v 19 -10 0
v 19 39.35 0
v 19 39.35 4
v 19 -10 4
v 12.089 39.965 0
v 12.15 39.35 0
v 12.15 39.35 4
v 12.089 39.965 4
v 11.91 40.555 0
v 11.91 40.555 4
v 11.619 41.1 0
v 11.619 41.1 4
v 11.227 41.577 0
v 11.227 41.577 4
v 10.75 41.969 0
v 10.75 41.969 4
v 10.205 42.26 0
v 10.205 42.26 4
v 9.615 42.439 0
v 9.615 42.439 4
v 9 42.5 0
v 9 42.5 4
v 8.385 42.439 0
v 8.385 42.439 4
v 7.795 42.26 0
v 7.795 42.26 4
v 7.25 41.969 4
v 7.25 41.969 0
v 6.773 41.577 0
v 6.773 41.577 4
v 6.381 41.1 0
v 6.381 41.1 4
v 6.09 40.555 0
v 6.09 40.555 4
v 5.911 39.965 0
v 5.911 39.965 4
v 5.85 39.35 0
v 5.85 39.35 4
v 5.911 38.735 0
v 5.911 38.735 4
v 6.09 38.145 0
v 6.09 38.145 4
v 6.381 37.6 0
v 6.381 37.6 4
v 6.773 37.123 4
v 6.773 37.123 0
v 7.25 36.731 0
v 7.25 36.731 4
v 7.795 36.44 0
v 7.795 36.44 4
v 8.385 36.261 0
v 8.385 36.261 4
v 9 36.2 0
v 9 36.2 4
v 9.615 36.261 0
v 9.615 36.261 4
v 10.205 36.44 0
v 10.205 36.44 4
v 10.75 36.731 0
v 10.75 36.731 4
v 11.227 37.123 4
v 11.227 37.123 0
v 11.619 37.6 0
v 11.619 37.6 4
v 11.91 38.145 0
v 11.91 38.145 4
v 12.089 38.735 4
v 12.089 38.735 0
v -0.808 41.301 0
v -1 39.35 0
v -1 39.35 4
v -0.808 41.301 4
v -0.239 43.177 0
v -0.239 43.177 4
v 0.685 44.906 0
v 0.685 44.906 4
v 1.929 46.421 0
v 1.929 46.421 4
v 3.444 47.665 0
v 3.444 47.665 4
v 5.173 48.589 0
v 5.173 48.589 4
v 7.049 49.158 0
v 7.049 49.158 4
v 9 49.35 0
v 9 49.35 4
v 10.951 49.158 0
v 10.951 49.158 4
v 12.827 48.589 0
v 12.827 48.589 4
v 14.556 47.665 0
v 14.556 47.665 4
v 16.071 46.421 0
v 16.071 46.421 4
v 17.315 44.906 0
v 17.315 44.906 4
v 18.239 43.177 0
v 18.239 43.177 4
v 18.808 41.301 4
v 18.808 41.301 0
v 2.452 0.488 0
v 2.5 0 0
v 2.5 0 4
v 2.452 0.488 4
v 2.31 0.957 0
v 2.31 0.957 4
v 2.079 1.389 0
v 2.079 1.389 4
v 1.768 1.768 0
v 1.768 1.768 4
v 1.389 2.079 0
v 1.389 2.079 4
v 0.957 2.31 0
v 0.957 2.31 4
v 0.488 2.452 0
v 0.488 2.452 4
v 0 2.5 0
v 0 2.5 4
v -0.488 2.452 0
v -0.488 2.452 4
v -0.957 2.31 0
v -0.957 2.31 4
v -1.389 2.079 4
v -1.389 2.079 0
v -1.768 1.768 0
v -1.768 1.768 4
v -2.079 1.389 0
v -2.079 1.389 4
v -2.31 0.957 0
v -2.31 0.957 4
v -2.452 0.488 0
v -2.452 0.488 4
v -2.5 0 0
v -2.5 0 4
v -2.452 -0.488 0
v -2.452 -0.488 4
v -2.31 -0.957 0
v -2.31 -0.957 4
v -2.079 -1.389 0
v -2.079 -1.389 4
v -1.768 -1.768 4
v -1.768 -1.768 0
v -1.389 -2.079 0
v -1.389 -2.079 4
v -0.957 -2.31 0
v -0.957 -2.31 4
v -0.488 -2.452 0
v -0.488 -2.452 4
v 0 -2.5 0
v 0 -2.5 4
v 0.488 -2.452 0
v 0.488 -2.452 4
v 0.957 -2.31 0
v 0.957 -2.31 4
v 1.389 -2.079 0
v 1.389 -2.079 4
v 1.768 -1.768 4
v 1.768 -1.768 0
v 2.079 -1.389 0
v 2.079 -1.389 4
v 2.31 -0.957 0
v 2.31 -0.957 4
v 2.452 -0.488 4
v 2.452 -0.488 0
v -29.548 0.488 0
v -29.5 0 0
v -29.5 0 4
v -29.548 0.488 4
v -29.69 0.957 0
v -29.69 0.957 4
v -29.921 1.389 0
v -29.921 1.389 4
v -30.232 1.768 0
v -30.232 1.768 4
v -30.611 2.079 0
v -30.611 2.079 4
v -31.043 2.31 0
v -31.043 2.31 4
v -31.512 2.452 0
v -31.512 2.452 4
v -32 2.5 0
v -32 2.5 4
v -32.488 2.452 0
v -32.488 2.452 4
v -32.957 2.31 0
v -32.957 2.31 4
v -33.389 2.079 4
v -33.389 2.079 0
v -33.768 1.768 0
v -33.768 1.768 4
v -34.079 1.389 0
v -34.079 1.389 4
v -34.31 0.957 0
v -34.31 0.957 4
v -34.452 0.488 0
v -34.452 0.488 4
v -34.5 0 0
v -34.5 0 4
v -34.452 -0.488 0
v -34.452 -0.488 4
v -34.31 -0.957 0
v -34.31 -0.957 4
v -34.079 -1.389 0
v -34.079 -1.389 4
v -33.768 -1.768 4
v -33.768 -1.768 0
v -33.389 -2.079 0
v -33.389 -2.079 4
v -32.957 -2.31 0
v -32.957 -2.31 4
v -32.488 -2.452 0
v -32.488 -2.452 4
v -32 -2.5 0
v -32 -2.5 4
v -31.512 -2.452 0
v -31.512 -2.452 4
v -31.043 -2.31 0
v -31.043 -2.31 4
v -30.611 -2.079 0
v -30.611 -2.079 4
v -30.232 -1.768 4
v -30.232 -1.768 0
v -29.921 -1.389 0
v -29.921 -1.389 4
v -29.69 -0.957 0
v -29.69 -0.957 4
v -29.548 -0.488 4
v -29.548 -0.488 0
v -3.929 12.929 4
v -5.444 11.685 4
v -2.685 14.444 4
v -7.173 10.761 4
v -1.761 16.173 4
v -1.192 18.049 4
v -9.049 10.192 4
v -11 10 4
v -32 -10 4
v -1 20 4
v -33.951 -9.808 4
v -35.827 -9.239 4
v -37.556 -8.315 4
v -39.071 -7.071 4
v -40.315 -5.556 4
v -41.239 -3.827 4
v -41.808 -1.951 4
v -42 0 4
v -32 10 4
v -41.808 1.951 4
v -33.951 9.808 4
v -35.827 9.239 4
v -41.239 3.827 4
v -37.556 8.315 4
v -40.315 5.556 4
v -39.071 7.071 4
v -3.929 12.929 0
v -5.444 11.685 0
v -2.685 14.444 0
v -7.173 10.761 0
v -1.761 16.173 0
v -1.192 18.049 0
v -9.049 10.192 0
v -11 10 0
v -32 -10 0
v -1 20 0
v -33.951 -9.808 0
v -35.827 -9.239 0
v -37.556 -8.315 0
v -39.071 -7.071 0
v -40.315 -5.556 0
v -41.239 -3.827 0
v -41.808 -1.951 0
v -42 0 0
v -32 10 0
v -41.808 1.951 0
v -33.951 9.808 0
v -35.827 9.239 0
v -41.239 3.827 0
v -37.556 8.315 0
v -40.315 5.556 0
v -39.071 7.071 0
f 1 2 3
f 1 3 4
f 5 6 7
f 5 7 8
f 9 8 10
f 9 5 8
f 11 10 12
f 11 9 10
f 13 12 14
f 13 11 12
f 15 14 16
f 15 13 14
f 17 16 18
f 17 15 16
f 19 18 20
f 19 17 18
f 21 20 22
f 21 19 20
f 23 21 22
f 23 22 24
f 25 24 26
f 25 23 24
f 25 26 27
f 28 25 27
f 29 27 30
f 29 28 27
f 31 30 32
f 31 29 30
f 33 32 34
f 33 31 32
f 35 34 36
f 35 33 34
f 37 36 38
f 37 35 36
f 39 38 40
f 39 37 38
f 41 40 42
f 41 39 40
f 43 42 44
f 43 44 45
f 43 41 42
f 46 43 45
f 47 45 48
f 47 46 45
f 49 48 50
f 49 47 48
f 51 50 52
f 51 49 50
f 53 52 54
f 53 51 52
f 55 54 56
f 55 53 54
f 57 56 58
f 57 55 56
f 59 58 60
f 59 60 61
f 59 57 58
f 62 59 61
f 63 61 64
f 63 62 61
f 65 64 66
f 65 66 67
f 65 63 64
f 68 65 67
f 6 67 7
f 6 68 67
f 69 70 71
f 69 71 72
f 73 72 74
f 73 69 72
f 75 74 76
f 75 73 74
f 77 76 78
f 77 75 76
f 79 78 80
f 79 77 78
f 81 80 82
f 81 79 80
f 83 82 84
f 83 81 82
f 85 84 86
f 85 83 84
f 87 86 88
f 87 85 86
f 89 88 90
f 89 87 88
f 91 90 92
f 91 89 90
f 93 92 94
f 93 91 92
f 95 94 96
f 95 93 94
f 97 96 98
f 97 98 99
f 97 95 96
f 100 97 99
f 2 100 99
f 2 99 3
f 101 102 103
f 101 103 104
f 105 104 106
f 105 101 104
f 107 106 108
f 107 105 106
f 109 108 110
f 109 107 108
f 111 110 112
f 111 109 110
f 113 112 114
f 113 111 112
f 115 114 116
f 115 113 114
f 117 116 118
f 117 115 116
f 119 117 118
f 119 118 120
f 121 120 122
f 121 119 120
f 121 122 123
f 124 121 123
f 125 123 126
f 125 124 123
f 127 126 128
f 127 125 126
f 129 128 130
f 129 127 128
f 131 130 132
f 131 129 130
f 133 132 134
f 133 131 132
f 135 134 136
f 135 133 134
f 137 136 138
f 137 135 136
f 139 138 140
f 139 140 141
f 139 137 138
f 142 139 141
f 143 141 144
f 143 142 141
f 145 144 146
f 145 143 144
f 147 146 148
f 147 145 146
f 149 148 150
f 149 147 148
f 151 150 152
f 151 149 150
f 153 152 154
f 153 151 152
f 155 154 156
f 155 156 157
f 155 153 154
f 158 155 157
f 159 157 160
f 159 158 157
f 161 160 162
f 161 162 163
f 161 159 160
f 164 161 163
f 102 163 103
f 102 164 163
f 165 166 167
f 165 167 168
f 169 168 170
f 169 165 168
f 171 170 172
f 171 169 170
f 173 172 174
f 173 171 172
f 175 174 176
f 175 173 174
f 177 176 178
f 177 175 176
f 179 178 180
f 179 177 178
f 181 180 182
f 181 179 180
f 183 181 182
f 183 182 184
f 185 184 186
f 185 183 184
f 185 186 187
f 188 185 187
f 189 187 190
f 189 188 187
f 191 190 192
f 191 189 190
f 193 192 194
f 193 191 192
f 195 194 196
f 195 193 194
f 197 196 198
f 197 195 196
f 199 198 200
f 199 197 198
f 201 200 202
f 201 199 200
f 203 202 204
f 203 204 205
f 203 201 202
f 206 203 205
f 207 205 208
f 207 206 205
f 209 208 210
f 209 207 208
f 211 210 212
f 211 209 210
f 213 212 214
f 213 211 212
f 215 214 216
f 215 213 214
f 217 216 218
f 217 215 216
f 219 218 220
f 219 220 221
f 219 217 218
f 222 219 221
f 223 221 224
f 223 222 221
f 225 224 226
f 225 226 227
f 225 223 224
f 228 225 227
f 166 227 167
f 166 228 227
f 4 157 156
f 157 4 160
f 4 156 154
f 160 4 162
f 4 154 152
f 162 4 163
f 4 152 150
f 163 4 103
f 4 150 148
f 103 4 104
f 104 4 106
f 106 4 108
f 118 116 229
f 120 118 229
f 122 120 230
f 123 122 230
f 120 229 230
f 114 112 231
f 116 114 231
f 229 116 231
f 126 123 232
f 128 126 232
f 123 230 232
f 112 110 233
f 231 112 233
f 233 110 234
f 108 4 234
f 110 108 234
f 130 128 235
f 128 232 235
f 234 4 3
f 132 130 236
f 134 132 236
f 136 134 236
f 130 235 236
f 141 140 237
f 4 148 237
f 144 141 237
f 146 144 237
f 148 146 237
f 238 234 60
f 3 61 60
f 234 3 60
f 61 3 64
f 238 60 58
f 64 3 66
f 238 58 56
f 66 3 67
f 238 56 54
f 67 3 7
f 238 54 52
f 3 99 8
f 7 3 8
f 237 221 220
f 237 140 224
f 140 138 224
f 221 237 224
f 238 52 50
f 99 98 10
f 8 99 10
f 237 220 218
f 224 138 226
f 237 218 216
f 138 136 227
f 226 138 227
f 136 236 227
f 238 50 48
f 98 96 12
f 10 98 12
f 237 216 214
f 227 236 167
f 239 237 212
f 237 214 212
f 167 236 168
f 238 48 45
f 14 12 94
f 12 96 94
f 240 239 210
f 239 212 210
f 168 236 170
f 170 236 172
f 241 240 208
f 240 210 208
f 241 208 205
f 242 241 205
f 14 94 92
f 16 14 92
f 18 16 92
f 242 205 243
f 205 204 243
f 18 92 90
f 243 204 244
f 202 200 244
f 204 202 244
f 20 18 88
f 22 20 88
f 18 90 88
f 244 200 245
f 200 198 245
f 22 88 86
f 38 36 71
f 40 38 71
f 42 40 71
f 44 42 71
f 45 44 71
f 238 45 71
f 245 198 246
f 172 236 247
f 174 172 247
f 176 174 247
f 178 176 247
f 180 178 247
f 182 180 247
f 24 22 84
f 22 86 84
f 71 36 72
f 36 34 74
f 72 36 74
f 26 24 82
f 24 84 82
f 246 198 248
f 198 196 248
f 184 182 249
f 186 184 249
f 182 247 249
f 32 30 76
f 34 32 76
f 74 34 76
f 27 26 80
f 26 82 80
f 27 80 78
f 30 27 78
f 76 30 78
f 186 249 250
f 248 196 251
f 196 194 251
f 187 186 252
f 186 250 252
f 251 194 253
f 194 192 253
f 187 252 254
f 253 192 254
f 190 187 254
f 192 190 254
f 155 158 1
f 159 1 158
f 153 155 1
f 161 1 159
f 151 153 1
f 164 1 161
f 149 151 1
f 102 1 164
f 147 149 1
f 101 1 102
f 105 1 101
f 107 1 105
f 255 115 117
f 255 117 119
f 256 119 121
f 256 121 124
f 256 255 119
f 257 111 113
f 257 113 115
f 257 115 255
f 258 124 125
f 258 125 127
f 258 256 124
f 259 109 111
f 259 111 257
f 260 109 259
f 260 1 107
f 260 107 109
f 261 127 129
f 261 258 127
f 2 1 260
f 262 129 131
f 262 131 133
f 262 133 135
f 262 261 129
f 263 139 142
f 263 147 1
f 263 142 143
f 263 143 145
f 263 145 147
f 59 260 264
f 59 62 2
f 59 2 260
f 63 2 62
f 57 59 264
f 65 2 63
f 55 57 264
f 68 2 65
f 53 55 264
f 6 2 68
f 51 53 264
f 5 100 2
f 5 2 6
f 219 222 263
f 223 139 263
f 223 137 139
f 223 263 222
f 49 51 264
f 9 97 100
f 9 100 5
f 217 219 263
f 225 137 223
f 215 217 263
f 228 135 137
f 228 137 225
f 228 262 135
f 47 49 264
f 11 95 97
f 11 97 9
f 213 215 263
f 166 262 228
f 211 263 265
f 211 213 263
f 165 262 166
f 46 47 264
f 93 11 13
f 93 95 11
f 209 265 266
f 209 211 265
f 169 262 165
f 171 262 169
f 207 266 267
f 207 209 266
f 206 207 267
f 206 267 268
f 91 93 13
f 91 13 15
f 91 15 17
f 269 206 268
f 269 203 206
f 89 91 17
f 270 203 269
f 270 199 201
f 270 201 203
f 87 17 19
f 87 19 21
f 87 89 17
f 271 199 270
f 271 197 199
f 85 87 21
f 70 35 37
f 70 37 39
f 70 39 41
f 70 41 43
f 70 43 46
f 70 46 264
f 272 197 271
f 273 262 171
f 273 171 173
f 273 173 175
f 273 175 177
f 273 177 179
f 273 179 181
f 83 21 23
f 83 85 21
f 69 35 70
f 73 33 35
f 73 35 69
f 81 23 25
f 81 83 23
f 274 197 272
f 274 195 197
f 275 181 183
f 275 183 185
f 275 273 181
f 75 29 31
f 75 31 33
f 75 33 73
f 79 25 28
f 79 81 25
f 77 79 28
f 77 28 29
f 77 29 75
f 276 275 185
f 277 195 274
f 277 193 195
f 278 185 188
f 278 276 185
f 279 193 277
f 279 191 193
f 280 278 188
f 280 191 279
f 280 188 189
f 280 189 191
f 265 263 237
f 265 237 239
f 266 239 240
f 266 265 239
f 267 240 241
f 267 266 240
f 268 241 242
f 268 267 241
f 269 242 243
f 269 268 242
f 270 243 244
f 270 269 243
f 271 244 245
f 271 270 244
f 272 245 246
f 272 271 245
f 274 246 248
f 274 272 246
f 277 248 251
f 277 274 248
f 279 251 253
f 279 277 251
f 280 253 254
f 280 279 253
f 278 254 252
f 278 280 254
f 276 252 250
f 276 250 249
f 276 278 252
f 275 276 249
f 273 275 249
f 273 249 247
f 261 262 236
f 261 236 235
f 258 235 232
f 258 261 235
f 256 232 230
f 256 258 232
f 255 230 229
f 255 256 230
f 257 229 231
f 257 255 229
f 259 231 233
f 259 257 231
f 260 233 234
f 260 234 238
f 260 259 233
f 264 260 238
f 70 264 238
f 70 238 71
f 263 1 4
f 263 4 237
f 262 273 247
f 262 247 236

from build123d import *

# Parameters (mm, degrees)
SKETCH_1_R      = 2.5
SKETCH_1_R_2    = 3.15
EXTRUDE_1_DEPTH = 4


with BuildPart() as part:
    # 草图1 → 凸台-拉伸1 (new body)
    with BuildSketch(Plane.XY):
        with BuildLine():
            ThreePointArc((-11, 10), (-3.928932188, 12.928932188), (-1, 20))
            Line((-1, 20), (-1, 39.35))
            ThreePointArc((-1, 39.35), (9, 49.35), (19, 39.35))
            Line((19, 39.35), (19, -10))
            Line((19, -10), (-32, -10))
            ThreePointArc((-32, -10), (-42, 0), (-32, 10))
            Line((-32, 10), (-11, 10))
        make_face()
        with Locations((-32, 0)):
            Circle(SKETCH_1_R, mode=Mode.SUBTRACT)
        with Locations((9, 39.35)):
            Circle(SKETCH_1_R_2, mode=Mode.SUBTRACT)
        Circle(SKETCH_1_R, mode=Mode.SUBTRACT)
    extrude(amount=EXTRUDE_1_DEPTH)


solid = part.part
